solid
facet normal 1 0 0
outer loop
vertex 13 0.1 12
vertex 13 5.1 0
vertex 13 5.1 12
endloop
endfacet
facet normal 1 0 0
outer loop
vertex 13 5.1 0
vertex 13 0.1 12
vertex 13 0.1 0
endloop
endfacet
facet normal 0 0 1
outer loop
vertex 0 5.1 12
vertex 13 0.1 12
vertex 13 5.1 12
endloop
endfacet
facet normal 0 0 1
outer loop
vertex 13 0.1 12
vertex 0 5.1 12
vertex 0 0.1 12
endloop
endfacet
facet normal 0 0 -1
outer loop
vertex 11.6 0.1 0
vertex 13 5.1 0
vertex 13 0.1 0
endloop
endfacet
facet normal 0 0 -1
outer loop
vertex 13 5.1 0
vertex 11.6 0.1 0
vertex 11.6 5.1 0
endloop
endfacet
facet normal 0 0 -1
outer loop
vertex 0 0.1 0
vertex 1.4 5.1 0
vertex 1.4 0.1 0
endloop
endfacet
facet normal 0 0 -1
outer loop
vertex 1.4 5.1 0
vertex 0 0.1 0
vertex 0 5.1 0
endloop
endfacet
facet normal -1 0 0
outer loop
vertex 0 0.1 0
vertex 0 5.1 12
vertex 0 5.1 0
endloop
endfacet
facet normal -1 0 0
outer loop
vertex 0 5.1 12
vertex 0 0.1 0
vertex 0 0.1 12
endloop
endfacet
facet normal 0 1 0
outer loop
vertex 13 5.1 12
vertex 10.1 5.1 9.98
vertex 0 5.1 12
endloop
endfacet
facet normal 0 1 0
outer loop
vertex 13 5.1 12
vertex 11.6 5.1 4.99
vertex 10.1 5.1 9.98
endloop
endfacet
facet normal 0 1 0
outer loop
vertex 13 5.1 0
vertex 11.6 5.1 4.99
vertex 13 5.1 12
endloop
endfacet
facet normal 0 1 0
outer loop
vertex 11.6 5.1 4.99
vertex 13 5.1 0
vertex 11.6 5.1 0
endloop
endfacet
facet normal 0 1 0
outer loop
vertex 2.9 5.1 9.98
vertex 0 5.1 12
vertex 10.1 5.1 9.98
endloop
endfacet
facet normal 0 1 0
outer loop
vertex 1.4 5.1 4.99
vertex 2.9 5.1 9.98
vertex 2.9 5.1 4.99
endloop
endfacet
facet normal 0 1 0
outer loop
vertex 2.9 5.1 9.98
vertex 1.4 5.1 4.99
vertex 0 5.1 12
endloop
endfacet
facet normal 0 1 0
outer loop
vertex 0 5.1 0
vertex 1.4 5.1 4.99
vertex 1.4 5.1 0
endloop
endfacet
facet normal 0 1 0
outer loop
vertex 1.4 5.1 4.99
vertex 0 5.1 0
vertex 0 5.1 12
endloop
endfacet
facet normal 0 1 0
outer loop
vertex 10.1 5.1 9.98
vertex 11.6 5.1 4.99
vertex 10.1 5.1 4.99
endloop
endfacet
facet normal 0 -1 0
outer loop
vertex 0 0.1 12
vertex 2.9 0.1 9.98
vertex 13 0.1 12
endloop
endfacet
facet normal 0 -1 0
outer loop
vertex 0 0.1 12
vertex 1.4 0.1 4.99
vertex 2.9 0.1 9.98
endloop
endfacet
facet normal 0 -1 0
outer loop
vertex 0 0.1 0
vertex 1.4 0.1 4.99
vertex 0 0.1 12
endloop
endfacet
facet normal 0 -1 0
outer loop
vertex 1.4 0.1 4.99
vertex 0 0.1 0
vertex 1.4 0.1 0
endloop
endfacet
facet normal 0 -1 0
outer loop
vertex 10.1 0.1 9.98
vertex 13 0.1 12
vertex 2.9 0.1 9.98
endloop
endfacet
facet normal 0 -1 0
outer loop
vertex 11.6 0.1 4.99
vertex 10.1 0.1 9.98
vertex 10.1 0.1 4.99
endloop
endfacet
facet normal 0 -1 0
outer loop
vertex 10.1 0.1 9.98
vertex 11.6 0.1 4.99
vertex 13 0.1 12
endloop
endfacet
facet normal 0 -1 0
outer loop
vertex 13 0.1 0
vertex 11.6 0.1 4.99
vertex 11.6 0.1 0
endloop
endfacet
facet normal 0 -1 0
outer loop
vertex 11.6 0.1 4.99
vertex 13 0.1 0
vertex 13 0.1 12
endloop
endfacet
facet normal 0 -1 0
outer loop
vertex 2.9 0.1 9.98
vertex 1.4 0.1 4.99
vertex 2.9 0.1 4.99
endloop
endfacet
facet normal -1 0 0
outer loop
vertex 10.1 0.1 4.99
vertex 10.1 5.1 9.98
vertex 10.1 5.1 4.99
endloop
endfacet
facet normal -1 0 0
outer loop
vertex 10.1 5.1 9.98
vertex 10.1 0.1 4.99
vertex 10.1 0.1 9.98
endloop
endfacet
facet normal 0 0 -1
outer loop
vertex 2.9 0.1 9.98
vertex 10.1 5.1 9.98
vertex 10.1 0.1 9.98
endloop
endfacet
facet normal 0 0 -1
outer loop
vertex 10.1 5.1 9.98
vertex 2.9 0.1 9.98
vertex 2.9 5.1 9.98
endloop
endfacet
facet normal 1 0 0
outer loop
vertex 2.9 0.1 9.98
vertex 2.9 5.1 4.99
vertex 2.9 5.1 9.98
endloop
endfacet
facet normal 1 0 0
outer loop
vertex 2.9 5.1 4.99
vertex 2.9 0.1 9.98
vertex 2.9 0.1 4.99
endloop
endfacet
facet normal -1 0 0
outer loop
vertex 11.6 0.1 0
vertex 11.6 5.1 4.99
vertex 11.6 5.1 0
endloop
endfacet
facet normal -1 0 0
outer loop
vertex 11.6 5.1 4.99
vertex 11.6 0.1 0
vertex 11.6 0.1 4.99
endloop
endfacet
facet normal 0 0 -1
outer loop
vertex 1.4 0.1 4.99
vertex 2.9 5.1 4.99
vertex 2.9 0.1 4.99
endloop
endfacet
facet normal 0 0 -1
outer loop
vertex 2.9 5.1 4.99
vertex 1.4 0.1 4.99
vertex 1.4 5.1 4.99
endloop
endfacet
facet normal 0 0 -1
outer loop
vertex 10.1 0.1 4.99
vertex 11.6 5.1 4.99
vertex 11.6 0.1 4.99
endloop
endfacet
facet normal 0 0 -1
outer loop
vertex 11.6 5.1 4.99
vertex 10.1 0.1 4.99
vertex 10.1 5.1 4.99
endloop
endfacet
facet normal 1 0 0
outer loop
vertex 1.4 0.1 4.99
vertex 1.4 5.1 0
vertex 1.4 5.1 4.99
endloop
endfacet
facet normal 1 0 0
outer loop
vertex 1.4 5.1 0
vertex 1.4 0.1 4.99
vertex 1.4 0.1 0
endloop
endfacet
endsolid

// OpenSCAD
module mgn7_aligner() {

    difference() {
        translate([0, 0.1, 0]) cube([13, 5, 12]);
        
        // Rail
        translate([2.9, 0, 4.98]) cube([7.2, 50, 5]);
        
        // Extrusion
        translate([1.4, 0, -0.01]) cube([10.2, 50, 5]);
    }
}

mgn7_aligner();

module mgn5_aligner() {

    difference() {
        translate([0, 0.1, 0]) cube([13, 5, 10]);
        
        // Rail
        translate([3.9, 0, 4.98]) cube([5.2, 50, 3.8]);
        
        // Extrusion
        translate([1.4, 0, -0.01]) cube([10.2, 50, 5]);
    }
}

//mgn5_aligner();
